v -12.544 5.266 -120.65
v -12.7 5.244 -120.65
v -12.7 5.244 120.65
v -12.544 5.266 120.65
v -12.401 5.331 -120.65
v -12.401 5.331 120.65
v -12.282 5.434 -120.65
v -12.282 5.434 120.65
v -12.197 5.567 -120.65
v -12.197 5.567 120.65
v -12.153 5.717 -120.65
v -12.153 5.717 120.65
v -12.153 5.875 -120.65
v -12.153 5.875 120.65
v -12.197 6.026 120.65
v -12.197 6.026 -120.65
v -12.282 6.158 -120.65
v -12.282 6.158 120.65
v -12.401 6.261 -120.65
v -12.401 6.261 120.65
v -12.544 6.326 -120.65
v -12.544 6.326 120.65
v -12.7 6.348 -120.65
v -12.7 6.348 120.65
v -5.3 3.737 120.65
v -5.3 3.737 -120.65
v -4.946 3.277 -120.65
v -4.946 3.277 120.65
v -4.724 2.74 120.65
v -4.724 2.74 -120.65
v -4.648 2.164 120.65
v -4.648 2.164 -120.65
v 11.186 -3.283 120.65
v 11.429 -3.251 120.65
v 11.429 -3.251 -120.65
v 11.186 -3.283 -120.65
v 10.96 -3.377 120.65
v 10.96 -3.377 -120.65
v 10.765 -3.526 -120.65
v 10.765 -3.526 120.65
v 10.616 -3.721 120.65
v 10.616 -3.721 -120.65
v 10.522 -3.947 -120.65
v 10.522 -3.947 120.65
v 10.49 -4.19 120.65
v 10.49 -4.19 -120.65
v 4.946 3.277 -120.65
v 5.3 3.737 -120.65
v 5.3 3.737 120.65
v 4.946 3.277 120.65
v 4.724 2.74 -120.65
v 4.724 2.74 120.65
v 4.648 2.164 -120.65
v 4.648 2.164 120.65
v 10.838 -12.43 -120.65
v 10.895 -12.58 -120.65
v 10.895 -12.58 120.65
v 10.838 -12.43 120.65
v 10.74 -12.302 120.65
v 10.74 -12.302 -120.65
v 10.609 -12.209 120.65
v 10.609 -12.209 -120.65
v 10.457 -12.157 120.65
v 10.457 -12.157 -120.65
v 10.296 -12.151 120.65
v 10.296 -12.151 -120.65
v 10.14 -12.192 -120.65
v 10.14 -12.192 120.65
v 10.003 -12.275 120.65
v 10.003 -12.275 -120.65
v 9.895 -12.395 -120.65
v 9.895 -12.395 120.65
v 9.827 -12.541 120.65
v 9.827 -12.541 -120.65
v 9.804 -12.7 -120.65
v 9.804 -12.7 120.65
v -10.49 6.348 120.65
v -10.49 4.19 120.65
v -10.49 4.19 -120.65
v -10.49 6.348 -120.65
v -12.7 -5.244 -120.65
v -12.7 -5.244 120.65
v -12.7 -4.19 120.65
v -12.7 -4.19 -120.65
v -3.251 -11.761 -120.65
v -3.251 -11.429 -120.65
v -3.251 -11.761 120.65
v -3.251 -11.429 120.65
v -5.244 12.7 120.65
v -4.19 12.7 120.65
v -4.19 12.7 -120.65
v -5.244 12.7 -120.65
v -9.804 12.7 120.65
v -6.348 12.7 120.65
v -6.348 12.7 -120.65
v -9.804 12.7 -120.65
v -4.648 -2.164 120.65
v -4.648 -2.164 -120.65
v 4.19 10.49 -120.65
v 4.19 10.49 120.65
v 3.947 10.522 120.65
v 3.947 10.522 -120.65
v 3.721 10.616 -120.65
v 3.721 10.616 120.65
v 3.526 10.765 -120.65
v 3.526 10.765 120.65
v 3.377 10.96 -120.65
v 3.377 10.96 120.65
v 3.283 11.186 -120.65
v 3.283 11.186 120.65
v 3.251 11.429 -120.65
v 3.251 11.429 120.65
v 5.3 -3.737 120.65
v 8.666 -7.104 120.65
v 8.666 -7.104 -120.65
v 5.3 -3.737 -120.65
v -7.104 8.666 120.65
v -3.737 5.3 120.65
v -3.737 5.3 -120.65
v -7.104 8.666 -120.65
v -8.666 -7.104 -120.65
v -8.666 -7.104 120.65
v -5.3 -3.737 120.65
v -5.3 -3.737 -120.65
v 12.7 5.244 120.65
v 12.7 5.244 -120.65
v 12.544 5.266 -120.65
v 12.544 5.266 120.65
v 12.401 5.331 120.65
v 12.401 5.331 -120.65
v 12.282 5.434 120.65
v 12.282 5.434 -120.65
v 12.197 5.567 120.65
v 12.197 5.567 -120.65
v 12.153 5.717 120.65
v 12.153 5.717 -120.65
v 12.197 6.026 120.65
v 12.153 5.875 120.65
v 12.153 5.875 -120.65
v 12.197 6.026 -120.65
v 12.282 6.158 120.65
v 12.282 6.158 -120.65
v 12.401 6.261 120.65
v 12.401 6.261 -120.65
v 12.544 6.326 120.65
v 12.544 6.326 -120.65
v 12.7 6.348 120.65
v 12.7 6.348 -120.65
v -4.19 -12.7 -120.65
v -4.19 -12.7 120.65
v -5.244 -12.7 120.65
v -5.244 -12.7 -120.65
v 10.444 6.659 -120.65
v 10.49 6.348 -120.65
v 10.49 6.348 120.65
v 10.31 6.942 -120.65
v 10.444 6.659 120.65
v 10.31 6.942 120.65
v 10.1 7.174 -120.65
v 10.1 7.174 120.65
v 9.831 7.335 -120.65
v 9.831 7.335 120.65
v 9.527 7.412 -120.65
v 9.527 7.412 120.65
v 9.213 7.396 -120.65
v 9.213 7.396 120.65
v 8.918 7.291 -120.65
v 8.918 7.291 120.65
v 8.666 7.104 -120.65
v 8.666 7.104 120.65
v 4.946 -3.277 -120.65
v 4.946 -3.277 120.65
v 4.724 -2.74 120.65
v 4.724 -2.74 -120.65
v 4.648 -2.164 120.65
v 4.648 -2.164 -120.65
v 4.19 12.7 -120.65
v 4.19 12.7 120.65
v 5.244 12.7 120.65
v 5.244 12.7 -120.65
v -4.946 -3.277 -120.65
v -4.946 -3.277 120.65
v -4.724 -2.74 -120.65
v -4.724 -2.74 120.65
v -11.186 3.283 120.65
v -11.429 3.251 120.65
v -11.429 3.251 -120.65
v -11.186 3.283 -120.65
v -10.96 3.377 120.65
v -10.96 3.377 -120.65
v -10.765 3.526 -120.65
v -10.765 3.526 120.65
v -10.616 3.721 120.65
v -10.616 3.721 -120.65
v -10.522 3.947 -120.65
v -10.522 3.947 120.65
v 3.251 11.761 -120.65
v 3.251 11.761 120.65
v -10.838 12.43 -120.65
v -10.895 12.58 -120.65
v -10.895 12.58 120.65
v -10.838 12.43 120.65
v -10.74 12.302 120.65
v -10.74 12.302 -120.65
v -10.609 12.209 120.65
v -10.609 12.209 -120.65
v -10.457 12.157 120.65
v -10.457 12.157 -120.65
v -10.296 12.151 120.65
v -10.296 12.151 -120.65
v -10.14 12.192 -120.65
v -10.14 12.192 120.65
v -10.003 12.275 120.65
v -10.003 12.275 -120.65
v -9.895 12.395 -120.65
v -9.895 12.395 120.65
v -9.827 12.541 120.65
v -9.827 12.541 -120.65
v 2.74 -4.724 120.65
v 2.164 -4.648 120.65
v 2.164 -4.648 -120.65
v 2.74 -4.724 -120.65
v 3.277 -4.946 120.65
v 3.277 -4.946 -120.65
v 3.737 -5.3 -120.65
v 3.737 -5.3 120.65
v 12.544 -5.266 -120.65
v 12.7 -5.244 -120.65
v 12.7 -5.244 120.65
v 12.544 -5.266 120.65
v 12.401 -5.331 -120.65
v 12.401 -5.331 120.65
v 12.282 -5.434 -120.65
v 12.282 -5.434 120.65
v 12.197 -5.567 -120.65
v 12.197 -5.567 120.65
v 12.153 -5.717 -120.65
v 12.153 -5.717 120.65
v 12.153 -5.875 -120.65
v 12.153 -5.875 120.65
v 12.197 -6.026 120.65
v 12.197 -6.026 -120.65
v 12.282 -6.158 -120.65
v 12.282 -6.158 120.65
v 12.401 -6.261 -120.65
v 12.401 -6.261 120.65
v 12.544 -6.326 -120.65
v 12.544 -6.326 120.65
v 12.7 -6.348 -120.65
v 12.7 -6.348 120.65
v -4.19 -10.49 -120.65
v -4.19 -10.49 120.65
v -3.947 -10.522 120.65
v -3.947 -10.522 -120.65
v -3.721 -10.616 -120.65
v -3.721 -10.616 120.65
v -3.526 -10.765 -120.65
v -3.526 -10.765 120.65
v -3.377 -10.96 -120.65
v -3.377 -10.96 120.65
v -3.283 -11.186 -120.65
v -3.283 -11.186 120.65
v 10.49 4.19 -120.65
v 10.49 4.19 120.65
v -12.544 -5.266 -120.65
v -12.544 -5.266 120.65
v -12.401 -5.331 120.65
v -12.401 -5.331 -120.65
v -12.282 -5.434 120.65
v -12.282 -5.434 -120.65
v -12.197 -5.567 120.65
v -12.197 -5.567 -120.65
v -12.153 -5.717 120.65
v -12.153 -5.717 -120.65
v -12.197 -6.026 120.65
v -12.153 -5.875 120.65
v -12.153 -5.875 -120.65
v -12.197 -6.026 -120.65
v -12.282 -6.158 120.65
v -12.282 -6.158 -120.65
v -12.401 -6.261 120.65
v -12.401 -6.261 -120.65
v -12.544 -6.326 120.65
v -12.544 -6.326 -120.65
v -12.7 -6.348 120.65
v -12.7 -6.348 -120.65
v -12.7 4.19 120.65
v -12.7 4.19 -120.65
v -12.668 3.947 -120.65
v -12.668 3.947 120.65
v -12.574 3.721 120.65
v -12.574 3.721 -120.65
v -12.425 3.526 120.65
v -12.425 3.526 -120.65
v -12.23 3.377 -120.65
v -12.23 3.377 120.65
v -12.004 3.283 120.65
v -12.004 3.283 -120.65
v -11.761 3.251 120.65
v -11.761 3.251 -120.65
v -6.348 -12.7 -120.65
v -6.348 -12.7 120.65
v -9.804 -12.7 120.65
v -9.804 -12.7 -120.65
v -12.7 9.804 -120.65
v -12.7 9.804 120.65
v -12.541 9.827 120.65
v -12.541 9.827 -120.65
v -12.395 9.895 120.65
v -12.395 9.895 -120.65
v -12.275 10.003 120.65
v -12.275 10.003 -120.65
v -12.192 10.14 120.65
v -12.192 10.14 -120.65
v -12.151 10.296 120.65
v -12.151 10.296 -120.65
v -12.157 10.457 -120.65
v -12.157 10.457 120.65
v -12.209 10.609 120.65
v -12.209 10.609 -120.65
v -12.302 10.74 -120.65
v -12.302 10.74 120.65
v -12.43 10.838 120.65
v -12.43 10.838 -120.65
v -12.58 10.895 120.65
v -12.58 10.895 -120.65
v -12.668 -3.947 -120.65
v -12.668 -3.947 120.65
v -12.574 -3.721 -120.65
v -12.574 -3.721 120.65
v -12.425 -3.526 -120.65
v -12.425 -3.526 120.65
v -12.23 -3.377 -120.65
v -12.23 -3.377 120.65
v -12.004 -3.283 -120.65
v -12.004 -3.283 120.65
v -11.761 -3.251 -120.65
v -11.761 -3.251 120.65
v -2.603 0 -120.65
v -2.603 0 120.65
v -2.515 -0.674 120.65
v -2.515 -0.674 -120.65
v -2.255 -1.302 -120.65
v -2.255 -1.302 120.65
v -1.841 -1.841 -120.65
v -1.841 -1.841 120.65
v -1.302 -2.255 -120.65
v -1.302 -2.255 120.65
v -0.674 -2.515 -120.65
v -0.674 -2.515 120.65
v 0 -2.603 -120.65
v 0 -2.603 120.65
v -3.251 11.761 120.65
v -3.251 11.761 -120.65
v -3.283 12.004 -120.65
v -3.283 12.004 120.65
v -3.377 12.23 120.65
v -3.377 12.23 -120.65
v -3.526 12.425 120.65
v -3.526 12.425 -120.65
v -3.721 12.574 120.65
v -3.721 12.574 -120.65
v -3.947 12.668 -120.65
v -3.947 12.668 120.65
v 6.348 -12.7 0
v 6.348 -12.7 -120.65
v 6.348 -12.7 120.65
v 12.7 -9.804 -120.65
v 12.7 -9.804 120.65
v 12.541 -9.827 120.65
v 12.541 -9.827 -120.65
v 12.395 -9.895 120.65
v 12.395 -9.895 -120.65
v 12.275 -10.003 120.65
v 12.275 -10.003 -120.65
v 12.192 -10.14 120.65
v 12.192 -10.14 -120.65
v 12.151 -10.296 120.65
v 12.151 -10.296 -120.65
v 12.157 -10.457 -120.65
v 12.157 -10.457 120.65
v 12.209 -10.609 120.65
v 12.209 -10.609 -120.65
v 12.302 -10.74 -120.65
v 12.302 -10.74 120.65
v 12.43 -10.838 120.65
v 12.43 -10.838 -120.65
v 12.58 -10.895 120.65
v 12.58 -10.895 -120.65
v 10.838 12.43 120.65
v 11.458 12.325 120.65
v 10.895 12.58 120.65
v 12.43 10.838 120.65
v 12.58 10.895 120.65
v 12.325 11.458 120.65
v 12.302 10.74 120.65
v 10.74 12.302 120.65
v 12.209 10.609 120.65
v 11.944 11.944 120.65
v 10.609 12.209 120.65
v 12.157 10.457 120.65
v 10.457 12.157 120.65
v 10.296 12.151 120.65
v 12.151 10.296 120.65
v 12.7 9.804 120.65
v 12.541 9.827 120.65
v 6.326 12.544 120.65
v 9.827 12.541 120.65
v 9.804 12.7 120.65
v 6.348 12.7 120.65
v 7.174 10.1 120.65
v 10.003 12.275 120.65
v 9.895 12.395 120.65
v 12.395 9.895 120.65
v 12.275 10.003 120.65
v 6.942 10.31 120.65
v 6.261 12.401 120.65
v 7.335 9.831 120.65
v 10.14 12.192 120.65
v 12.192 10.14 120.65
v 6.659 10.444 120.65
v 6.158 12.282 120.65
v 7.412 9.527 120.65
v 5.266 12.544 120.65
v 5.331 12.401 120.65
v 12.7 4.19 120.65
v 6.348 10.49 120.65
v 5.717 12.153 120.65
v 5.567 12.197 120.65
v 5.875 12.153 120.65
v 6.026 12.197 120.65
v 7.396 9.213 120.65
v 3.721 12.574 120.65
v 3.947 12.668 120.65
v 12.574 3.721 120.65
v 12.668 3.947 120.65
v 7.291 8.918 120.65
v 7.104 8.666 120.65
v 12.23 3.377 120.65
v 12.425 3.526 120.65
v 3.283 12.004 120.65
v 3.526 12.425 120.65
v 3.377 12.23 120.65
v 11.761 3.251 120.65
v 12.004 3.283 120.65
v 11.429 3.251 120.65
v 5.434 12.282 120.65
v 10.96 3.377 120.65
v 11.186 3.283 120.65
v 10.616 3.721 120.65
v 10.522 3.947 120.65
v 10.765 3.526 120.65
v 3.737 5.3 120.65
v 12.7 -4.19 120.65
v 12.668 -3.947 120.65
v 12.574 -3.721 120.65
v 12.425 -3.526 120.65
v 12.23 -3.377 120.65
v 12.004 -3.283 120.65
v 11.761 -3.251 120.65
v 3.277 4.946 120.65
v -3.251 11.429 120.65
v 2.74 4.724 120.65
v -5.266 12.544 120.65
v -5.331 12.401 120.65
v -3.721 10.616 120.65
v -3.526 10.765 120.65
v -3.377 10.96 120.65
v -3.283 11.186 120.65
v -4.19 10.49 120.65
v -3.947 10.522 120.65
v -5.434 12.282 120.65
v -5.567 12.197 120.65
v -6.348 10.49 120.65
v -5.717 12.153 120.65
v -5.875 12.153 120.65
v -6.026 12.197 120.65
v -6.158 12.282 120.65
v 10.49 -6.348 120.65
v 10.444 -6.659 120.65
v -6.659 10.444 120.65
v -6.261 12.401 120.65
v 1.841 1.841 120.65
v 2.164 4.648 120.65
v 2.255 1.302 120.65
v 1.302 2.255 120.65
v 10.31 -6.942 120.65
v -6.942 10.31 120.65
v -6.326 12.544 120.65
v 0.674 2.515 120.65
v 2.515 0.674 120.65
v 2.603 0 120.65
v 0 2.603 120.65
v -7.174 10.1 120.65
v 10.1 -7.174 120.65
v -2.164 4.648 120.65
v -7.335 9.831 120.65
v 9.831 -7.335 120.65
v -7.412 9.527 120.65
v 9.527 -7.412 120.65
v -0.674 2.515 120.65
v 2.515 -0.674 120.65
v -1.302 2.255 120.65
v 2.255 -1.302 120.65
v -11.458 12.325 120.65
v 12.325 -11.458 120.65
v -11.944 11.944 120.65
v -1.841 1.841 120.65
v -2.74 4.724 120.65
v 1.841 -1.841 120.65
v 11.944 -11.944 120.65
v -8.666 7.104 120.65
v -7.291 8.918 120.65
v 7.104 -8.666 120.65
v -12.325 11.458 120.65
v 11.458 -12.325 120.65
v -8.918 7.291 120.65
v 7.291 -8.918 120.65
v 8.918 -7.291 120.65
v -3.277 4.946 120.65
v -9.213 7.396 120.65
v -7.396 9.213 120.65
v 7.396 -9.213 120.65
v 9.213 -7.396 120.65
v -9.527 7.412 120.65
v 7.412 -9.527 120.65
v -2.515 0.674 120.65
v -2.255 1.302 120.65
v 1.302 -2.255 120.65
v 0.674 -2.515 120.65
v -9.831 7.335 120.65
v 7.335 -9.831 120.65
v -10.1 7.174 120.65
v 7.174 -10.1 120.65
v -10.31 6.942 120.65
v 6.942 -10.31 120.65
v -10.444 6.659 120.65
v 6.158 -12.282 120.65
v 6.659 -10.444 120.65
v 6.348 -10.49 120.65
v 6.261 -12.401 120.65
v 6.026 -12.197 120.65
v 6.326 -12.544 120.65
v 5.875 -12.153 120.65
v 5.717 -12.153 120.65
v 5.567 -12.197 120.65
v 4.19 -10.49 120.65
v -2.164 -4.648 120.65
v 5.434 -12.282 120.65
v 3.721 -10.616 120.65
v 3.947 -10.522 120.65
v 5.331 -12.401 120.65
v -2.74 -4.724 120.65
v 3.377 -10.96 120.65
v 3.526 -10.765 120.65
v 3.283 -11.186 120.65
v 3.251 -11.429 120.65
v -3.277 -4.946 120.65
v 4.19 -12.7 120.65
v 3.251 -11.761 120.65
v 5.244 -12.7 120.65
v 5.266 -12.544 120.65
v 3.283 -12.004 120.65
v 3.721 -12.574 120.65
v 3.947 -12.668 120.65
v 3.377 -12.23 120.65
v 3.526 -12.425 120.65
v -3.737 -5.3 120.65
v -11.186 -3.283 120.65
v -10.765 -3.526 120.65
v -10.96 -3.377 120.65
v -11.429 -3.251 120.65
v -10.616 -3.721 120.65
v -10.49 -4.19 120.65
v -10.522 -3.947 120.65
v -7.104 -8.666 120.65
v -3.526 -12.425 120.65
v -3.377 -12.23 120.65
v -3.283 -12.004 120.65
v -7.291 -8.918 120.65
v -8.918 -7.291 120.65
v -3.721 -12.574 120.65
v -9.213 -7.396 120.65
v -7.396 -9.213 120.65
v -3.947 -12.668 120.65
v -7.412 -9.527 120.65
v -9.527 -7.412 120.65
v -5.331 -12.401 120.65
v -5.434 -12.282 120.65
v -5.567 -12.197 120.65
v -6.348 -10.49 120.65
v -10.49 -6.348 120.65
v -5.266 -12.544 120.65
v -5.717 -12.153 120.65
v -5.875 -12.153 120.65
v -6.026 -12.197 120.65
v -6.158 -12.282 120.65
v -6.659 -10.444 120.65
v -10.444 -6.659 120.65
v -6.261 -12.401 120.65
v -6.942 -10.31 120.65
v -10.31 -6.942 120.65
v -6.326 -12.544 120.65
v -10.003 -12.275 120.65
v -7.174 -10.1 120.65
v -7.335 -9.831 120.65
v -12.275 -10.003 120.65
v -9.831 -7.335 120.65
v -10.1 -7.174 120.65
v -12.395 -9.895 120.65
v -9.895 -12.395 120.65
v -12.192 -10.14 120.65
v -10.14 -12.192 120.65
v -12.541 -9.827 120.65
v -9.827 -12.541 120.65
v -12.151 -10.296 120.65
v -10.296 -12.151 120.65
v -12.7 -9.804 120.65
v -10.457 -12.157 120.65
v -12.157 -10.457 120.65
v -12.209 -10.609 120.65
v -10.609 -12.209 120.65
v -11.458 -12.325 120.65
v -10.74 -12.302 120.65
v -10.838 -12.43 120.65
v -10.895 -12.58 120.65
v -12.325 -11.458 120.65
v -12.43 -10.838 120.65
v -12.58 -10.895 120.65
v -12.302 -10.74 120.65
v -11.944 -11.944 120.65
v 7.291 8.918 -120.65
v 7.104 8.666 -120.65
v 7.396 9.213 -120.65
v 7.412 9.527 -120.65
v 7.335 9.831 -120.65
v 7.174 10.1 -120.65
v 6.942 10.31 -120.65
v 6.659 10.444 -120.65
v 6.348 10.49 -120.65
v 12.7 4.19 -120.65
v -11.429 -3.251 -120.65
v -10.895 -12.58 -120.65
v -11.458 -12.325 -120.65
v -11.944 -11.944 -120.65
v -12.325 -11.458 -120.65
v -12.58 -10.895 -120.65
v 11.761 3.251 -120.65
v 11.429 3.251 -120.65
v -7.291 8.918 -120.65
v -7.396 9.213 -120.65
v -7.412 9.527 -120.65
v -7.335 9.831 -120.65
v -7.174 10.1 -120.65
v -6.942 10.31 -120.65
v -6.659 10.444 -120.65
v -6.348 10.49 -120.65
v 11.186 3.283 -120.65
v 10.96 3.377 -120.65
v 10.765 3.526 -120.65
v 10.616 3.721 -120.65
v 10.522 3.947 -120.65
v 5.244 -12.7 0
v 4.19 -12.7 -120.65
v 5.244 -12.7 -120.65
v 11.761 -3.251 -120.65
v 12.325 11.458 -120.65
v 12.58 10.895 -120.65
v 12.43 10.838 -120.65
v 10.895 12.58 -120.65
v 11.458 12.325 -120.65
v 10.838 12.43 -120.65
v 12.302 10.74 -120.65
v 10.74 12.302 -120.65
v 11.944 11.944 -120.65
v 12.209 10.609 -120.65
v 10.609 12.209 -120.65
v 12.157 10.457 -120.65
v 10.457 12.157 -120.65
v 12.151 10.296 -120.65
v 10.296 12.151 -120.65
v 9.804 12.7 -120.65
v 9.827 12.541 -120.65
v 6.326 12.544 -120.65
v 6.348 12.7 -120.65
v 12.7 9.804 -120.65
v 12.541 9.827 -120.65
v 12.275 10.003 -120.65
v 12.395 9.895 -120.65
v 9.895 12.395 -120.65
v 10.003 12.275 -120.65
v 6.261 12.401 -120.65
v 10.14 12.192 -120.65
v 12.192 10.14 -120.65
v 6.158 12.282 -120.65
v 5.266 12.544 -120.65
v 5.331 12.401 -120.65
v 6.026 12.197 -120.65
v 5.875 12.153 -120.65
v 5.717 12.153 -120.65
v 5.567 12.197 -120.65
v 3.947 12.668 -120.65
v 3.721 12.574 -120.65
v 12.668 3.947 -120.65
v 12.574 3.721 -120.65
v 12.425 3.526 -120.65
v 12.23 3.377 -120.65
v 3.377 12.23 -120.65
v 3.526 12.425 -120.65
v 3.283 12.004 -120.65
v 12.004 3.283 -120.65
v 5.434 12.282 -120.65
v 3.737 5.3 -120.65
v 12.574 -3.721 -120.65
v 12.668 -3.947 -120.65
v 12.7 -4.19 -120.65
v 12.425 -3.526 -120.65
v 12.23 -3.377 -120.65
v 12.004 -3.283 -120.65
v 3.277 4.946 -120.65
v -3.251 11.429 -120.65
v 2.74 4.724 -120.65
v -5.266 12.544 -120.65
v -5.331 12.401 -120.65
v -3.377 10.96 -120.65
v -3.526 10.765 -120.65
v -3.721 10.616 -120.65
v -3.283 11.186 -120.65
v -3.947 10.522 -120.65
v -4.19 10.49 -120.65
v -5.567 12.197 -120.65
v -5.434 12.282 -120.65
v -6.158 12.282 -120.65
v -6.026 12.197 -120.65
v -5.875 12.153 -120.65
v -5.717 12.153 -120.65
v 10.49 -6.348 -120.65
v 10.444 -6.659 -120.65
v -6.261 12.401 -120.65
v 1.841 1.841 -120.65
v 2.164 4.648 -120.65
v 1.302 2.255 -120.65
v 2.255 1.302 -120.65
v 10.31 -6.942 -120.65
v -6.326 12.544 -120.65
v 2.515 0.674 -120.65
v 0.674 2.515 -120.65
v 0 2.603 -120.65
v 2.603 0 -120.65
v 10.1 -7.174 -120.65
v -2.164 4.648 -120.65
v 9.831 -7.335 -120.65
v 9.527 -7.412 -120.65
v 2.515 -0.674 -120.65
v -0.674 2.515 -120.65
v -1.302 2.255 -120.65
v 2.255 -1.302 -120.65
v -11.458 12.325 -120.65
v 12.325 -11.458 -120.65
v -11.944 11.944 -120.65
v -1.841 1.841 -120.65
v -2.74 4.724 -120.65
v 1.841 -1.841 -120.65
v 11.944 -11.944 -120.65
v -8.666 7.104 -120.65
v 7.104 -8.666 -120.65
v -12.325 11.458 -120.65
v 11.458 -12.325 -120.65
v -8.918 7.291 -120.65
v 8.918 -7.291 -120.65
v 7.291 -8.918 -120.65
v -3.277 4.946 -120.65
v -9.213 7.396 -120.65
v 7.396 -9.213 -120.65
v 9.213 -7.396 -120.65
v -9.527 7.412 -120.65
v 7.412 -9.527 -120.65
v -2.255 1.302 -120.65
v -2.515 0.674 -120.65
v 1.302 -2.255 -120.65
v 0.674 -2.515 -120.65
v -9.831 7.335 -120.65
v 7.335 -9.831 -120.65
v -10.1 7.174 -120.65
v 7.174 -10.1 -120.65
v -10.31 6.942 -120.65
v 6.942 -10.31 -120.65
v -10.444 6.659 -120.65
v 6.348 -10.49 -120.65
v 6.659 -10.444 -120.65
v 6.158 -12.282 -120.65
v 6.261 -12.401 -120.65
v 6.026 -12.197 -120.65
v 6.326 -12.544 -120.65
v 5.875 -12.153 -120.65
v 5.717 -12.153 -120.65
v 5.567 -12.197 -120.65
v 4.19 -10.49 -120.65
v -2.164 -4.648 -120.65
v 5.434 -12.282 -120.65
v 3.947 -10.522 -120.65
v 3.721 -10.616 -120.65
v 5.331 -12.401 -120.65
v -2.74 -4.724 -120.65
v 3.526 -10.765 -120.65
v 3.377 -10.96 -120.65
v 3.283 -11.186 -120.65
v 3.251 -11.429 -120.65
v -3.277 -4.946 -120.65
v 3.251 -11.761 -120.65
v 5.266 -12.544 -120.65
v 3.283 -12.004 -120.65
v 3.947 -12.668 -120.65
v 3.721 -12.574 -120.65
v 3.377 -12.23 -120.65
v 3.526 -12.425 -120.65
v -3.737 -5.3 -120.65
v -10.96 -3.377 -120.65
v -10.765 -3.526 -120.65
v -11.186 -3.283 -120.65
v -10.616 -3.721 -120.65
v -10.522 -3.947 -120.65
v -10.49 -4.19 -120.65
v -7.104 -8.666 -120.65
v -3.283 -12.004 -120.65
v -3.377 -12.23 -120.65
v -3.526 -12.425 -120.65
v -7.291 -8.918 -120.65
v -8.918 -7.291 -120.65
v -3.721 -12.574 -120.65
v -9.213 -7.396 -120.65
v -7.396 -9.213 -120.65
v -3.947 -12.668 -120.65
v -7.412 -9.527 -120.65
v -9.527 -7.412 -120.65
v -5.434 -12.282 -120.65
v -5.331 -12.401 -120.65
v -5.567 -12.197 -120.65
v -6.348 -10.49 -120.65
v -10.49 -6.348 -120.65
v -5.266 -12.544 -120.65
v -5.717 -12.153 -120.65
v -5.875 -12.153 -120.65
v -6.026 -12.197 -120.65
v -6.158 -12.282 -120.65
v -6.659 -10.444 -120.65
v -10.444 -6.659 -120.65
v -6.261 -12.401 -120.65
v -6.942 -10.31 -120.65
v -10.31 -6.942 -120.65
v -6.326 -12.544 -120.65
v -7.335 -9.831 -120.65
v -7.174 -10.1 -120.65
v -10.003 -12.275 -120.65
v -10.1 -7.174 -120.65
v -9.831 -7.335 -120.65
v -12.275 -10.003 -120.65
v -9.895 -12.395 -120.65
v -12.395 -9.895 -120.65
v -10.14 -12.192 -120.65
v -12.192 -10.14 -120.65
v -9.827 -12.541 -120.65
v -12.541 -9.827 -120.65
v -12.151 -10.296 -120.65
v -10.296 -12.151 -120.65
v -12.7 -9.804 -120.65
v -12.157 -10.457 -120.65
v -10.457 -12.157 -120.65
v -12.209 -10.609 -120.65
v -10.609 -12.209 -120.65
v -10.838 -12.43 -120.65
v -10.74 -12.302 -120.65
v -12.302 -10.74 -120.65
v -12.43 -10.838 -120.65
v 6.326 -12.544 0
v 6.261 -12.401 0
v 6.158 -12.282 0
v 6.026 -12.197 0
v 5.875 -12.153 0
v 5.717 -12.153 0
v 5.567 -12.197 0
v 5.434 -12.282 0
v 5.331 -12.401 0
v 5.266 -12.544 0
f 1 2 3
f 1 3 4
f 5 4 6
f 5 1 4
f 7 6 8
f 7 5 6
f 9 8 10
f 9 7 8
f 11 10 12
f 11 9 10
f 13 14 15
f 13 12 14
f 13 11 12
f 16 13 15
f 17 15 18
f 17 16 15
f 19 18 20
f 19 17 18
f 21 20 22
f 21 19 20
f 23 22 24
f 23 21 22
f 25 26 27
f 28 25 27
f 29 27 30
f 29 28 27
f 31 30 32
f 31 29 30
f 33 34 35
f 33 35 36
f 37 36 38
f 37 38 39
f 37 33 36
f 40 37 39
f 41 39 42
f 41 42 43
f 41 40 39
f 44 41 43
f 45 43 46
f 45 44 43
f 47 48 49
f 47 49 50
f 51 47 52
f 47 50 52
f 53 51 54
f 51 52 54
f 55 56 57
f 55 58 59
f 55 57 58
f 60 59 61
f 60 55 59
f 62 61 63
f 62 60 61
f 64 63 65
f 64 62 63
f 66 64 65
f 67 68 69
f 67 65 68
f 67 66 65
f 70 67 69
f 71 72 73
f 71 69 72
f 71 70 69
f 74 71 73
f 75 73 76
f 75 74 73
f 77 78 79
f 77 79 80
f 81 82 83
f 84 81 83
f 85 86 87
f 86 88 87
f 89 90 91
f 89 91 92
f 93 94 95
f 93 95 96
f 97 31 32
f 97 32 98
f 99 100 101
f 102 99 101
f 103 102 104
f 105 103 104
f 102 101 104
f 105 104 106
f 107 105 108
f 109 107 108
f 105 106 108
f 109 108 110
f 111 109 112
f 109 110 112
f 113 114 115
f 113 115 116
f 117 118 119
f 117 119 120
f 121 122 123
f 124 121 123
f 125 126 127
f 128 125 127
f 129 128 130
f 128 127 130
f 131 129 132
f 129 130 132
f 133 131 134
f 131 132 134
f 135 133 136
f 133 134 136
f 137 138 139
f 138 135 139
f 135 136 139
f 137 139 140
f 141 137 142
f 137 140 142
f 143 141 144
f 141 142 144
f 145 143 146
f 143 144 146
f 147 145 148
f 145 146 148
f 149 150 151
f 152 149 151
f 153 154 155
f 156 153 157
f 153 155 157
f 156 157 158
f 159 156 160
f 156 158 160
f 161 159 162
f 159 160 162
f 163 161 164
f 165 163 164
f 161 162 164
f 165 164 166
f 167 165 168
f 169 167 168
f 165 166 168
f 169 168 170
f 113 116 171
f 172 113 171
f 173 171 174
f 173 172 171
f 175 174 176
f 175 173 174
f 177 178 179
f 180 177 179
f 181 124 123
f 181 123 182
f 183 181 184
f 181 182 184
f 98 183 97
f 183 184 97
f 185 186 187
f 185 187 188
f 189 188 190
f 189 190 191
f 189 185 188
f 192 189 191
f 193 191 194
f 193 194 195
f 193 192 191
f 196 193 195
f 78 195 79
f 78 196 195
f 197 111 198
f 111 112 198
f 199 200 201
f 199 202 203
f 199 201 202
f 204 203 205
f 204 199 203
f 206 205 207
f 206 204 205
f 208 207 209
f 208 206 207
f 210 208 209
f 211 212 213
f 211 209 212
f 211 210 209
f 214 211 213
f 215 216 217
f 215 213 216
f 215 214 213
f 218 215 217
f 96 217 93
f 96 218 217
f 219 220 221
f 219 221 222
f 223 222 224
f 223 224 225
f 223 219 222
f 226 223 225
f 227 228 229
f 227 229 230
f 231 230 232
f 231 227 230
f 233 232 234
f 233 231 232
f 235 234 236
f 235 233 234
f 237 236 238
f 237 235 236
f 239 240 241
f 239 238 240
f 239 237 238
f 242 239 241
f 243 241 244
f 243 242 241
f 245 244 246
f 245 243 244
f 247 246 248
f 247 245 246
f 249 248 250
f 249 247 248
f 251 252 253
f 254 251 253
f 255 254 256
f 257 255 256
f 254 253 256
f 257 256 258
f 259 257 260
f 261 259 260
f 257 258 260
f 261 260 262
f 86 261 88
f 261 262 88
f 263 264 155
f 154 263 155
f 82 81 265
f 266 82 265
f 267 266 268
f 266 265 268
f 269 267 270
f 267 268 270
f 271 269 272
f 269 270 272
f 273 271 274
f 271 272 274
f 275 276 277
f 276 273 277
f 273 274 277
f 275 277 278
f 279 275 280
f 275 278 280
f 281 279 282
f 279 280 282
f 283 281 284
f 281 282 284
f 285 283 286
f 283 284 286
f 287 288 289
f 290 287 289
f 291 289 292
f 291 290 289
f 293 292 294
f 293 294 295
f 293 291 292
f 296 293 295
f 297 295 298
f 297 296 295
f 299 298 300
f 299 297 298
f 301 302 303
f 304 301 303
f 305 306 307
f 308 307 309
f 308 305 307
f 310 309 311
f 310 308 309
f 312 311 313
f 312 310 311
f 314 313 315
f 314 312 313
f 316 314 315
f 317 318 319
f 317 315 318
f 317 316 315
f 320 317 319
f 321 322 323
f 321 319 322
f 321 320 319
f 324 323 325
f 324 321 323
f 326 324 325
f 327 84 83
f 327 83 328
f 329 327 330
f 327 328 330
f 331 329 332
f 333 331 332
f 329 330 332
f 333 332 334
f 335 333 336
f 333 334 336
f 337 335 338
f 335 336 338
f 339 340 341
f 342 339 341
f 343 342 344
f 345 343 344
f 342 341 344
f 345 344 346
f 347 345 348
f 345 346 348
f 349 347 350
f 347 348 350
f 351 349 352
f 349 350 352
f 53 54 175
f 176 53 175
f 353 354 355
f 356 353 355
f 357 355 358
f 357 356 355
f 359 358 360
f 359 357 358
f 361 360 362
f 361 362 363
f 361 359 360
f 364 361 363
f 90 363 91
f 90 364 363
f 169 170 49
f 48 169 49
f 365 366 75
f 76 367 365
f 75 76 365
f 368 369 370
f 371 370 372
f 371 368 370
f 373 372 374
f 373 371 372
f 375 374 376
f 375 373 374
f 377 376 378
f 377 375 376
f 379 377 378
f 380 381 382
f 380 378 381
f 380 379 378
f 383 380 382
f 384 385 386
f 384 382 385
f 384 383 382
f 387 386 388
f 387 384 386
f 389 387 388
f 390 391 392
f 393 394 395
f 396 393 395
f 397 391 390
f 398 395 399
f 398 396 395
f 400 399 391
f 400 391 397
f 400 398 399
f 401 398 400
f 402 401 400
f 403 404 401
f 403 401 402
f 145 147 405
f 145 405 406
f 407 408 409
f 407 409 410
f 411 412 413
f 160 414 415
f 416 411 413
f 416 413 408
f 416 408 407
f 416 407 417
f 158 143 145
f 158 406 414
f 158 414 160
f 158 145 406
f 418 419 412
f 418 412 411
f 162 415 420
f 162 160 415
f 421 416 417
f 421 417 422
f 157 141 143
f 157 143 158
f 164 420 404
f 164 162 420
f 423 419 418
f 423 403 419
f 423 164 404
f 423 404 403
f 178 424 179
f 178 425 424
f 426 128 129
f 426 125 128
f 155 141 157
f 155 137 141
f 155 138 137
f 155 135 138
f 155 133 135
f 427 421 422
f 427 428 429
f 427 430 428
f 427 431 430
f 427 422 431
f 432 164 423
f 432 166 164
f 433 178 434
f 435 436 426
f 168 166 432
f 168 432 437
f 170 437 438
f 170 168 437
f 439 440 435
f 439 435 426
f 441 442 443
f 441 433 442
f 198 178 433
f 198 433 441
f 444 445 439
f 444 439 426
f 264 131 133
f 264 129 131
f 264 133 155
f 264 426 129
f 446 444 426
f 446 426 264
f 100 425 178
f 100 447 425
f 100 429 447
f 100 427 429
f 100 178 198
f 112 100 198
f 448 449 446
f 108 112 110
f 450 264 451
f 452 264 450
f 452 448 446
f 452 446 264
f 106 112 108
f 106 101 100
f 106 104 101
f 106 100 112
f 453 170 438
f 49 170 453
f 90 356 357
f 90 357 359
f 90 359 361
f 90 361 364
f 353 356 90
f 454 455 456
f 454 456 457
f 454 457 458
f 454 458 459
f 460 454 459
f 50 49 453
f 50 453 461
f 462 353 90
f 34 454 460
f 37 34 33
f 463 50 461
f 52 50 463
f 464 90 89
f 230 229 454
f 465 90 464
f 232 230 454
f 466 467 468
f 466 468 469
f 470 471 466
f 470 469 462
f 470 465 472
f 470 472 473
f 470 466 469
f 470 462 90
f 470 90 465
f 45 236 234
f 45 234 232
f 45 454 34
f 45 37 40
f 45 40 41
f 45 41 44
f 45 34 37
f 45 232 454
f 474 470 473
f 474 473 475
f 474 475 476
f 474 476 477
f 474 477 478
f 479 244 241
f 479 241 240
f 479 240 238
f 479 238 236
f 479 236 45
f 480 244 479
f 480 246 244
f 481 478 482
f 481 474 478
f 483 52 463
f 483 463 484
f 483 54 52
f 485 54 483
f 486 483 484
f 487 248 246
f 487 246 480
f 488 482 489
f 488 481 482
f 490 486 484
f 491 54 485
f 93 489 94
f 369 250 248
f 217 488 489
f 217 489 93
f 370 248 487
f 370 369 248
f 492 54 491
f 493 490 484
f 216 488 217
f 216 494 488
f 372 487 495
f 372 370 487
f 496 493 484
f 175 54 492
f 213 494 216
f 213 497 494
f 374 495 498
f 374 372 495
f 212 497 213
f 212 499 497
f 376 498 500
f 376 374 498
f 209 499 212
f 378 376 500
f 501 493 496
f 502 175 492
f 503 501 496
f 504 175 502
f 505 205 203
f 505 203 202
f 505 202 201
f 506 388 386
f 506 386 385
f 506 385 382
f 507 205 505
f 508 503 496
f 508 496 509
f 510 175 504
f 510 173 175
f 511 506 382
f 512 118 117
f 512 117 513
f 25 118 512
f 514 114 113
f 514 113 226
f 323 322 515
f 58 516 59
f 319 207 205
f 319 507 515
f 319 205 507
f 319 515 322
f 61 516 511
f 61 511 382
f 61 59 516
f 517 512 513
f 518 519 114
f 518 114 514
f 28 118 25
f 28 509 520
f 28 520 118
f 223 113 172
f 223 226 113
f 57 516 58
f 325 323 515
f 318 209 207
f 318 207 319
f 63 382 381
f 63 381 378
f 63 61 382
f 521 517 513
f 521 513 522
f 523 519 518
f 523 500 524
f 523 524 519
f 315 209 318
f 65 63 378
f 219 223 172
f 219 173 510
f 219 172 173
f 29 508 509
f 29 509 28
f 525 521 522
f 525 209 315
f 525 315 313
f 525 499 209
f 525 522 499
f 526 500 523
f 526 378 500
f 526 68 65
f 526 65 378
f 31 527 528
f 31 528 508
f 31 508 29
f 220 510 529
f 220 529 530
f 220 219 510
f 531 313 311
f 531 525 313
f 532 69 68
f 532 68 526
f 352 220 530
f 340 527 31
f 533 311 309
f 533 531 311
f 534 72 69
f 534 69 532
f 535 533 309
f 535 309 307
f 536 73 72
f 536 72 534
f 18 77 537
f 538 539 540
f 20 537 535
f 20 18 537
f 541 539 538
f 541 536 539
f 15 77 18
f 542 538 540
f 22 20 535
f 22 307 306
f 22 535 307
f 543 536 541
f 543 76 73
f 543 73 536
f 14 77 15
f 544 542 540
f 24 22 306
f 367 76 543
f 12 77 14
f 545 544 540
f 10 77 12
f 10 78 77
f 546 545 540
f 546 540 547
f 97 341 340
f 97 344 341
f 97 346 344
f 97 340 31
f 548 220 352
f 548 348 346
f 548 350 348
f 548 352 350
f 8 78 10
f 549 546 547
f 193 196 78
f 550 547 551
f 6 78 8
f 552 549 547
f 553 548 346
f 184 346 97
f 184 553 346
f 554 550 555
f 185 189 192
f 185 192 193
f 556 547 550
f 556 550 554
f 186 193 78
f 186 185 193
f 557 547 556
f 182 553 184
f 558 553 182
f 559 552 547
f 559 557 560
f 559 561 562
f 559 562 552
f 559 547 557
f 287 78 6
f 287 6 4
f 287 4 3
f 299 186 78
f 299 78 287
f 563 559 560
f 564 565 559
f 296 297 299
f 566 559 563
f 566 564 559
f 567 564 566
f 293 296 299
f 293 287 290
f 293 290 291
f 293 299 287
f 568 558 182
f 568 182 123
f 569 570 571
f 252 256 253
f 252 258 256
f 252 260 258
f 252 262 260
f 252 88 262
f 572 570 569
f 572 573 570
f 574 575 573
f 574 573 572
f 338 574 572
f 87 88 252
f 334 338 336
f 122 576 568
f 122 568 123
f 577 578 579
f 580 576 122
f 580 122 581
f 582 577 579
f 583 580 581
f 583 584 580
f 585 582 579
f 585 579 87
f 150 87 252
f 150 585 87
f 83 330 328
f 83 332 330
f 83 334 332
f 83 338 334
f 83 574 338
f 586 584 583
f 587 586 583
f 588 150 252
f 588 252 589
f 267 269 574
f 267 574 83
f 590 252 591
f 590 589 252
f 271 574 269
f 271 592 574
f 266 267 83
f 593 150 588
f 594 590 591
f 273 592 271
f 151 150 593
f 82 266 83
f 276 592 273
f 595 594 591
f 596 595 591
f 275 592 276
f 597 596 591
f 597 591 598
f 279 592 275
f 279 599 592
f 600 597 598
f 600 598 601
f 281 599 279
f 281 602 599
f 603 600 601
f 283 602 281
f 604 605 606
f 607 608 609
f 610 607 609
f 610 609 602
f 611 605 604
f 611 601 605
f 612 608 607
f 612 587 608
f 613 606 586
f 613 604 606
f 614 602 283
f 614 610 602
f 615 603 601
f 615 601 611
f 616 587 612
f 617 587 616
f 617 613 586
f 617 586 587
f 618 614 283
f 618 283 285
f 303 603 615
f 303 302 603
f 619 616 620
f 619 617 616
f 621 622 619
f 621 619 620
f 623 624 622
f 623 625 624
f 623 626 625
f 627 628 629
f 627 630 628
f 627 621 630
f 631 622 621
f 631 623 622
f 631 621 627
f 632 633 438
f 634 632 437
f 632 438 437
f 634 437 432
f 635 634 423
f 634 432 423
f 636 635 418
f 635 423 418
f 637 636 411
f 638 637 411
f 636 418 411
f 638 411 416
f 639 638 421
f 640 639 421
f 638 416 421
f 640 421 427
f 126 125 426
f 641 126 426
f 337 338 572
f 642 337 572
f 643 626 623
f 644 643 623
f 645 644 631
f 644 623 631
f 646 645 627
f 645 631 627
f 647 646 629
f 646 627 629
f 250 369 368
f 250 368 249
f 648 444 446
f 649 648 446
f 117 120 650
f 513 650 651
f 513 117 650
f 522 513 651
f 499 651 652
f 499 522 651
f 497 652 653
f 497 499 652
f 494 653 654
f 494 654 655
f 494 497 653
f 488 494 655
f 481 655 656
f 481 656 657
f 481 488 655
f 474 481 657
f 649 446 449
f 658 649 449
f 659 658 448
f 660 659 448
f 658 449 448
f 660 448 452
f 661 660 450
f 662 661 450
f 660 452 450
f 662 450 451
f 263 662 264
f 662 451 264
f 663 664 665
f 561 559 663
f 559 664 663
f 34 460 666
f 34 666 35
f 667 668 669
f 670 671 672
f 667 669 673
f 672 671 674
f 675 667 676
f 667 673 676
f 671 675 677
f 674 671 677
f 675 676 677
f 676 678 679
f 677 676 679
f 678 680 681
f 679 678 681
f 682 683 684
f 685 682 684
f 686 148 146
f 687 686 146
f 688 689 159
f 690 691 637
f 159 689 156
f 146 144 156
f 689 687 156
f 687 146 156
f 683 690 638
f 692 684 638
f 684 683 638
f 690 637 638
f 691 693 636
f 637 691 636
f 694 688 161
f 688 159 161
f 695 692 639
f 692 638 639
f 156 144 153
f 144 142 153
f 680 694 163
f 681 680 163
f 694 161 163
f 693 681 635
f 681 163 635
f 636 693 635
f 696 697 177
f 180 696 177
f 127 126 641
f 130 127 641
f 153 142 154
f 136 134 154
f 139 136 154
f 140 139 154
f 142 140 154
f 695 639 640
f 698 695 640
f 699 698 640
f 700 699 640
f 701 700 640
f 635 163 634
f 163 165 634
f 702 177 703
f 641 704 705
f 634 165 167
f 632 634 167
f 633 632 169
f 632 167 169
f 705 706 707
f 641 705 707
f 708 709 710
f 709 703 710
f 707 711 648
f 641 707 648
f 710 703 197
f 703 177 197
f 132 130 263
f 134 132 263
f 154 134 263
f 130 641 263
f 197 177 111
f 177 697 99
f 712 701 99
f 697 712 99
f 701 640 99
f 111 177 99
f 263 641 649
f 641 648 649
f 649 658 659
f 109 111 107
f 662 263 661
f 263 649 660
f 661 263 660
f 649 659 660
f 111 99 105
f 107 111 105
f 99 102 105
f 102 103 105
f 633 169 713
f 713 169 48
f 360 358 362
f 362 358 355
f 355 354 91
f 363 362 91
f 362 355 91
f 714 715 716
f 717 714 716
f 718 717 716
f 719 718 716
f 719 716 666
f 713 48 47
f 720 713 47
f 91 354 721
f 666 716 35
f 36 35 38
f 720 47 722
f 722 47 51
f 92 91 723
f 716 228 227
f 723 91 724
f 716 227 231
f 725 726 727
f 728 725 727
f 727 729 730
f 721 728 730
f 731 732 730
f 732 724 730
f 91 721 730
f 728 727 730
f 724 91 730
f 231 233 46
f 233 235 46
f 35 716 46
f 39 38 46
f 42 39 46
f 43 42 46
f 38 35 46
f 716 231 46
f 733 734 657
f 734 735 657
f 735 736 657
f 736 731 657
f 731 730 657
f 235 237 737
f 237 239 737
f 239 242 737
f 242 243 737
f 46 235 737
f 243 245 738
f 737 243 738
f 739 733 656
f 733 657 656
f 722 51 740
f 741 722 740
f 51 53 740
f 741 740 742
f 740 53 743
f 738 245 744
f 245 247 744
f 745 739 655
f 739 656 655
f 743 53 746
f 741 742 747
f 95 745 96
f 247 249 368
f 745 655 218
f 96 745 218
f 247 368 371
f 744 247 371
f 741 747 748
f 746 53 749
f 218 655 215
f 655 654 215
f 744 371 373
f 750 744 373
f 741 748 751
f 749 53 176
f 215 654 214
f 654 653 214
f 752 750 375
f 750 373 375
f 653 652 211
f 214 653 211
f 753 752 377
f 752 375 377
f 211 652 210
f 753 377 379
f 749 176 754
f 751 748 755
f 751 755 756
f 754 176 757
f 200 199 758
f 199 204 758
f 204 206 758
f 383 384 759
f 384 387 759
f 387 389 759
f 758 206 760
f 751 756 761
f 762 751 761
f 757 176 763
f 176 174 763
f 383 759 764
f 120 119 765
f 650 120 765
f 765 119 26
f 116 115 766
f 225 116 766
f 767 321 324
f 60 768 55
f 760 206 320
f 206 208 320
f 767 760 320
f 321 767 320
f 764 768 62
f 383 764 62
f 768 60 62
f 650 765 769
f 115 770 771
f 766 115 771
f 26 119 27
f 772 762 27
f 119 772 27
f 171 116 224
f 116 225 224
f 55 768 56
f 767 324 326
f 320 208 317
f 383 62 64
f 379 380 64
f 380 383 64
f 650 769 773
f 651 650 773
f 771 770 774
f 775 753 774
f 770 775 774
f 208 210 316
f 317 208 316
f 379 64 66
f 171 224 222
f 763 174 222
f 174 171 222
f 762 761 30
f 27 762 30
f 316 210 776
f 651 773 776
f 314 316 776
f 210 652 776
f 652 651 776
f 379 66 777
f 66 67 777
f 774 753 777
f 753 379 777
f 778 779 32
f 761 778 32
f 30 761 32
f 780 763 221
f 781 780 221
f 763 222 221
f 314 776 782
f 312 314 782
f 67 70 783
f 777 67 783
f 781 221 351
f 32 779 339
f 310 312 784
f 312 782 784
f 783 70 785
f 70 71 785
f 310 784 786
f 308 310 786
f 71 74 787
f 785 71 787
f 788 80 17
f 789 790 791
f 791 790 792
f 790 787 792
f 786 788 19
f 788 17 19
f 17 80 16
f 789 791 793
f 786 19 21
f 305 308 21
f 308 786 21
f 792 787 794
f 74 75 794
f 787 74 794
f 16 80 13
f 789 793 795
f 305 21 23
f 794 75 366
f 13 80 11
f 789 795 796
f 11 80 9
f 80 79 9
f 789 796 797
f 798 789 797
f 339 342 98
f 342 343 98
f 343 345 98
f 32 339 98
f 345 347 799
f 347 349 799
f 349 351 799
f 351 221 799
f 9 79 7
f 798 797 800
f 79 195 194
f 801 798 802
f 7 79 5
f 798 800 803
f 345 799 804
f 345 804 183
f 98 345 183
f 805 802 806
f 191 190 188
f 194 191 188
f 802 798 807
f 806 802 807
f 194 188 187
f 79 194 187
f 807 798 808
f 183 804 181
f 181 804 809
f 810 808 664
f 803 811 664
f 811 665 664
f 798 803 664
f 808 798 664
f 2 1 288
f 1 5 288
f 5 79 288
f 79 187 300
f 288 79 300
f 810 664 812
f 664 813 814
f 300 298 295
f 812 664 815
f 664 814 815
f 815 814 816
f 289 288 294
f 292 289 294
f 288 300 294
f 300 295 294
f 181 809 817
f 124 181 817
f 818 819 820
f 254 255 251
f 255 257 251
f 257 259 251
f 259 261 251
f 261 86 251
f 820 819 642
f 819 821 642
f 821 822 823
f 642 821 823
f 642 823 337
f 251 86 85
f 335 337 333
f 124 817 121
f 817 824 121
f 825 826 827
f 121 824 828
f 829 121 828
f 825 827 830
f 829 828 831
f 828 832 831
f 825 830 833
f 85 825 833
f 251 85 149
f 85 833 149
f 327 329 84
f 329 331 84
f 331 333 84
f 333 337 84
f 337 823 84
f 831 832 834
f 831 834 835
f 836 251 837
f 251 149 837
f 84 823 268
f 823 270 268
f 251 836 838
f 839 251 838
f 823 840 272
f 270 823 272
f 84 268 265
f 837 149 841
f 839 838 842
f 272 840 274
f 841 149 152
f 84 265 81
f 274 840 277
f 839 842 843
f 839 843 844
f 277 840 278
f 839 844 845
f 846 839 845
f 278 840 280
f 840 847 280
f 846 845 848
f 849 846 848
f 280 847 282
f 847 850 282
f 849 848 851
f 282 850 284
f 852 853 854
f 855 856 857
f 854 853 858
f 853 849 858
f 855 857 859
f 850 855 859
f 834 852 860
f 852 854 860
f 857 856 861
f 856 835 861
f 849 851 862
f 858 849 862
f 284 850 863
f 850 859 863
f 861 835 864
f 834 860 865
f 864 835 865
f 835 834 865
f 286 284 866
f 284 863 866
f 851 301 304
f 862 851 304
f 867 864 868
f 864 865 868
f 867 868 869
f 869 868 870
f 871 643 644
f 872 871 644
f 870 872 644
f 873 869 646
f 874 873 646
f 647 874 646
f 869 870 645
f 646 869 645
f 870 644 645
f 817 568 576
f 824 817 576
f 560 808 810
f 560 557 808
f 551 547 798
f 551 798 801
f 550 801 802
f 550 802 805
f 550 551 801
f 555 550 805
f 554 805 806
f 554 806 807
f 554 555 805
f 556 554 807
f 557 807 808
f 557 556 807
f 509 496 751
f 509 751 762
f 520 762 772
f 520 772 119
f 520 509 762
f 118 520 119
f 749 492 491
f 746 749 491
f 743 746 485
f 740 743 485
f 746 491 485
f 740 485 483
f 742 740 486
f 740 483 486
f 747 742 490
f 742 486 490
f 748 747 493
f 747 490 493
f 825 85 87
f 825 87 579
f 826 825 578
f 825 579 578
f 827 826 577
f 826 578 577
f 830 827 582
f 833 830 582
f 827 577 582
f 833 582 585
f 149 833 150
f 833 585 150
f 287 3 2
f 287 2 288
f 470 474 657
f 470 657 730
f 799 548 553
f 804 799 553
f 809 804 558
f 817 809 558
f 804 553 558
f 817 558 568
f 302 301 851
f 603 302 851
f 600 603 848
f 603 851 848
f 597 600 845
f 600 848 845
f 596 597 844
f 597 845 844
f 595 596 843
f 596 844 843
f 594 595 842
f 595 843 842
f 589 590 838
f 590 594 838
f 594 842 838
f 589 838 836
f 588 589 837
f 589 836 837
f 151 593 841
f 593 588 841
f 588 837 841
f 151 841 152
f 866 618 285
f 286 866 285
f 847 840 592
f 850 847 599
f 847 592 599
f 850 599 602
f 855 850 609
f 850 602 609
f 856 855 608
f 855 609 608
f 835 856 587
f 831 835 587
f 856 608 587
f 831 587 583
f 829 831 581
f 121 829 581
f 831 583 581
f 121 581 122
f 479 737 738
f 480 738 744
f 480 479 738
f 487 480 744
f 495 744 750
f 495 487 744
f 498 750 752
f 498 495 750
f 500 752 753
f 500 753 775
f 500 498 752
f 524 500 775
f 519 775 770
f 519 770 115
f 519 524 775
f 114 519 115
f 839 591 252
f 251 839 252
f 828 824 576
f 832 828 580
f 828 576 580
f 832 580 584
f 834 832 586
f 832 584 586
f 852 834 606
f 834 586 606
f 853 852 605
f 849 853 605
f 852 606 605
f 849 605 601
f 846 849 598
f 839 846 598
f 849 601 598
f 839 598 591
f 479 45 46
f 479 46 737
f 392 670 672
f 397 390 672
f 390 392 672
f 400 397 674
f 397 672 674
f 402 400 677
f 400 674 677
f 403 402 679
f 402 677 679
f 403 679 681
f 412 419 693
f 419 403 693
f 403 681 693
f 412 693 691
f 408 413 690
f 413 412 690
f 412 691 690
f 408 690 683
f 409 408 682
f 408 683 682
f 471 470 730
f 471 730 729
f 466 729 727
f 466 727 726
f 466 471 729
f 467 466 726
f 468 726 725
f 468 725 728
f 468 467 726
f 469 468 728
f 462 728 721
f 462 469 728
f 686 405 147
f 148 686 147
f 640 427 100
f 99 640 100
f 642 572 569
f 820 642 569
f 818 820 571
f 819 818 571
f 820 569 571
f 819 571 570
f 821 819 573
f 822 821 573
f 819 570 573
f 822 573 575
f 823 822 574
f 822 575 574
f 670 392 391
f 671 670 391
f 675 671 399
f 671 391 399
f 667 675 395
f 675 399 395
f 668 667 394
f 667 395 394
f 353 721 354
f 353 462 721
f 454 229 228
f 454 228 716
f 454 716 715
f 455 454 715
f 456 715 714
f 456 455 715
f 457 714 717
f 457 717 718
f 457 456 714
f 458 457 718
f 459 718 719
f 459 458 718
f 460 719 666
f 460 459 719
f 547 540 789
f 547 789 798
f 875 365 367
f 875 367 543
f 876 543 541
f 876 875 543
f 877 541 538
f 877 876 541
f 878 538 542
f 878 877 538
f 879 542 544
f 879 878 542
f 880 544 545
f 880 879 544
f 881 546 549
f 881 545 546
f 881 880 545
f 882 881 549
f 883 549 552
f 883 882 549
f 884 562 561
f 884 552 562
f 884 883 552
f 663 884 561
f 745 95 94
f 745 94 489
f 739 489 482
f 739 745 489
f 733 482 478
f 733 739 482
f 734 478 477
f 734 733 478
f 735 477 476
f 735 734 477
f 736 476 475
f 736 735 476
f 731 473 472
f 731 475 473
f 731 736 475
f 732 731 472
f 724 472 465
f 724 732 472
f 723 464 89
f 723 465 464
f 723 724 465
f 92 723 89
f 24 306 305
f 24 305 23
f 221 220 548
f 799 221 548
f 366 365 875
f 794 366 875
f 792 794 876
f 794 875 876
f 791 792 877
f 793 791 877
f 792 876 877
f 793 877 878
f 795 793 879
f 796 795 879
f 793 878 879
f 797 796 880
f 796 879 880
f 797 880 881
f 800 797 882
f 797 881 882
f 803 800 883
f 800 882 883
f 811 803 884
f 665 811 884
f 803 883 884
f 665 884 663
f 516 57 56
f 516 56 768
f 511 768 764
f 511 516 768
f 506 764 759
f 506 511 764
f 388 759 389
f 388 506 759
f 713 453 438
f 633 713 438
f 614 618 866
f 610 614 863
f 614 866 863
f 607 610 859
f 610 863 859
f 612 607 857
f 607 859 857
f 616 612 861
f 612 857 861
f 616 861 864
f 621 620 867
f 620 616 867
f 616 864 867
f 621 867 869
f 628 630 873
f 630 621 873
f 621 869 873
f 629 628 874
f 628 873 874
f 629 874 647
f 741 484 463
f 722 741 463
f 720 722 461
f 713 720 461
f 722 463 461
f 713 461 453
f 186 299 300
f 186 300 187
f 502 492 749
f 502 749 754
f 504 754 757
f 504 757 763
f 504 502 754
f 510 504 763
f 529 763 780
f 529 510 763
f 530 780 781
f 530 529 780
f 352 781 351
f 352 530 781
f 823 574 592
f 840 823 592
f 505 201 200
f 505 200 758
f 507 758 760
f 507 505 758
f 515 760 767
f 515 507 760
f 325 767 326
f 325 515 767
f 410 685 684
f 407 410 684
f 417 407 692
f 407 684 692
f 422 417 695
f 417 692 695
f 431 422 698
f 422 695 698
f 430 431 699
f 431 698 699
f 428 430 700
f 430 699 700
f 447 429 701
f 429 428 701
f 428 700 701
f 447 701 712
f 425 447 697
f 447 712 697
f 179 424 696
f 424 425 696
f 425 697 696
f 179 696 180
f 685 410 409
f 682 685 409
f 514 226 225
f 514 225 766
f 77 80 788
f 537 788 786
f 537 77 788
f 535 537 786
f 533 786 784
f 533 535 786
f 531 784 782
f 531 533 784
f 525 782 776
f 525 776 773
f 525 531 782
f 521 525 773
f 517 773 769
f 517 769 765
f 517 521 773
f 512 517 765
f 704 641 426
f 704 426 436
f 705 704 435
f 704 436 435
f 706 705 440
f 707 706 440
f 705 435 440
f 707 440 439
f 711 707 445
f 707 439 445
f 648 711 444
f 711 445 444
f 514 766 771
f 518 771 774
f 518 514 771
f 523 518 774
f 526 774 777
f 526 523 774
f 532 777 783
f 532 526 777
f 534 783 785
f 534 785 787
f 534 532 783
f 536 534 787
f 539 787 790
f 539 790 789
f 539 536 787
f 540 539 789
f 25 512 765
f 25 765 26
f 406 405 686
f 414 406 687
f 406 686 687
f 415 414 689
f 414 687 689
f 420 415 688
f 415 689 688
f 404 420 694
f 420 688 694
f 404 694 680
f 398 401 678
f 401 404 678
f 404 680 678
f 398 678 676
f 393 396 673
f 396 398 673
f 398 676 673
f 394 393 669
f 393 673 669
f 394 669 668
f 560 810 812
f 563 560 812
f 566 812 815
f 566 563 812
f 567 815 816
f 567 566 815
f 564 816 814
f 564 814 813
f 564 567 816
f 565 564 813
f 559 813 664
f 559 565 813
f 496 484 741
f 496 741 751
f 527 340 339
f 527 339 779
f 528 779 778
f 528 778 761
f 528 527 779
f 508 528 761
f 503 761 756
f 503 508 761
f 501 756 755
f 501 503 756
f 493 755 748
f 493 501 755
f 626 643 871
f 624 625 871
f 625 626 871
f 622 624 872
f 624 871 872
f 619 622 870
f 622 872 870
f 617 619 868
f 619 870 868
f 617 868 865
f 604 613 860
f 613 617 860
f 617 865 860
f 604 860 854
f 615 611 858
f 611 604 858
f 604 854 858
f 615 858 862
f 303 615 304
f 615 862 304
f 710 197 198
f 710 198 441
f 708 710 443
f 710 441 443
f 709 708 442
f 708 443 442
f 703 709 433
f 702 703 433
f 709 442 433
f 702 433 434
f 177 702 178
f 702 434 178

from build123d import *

# Parameters (mm, degrees)
BOSS_EXTRUDE1_DEPTH     = 120.65
SKETCH5_R               = 0.55245
CUT_EXTRUDE1_DEPTH      = 121.65
CUT_EXTRUDE1_DEPTH_BACK = 121.65


with BuildPart() as part:
    # Sketch4 → Boss-Extrude1 (new body, symmetric)
    with BuildSketch(Plane.XY):
        with BuildLine():
            Line((4.190365, -12.7), (10.11729625, -12.7))
            ThreePointArc((10.11729625, -12.7), (11.943543585, -11.943543585), (12.7, -10.11729625))
            Line((12.7, -10.11729625), (12.7, -4.190365))
            ThreePointArc((12.7, -4.190365), (12.42492494, -3.52627506), (11.760835, -3.2512))
            Line((11.760835, -3.2512), (11.429365, -3.2512))
            ThreePointArc((11.429365, -3.2512), (10.76527506, -3.52627506), (10.4902, -4.190365))
            Line((10.4902, -4.190365), (10.4902, -6.348478019))
            ThreePointArc((10.4902, -6.348478019), (9.830707141, -7.335478831), (8.666460301, -7.103895736))
            Line((8.666460301, -7.103895736), (5.299899128, -3.737334563))
            ThreePointArc((5.299899128, -3.737334563), (4.817571085, -3.015479634), (4.6482, -2.16399369))
            Line((4.6482, -2.16399369), (4.6482, 0))
            Line((4.6482, 0), (2.6035, 0))
            ThreePointArc((2.6035, 0), (1.840952505, -1.840952505), (0, -2.6035))
            Line((0, -2.6035), (0, -4.6482))
            Line((0, -4.6482), (2.16399369, -4.6482))
            ThreePointArc((2.16399369, -4.6482), (3.015479634, -4.817571085), (3.737334563, -5.299899128))
            Line((3.737334563, -5.299899128), (7.103895736, -8.666460301))
            ThreePointArc((7.103895736, -8.666460301), (7.335478831, -9.830707141), (6.348478019, -10.4902))
            Line((6.348478019, -10.4902), (4.190365, -10.4902))
            ThreePointArc((4.190365, -10.4902), (3.52627506, -10.76527506), (3.2512, -11.429365))
            Line((3.2512, -11.429365), (3.2512, -11.760835))
            ThreePointArc((3.2512, -11.760835), (3.52627506, -12.42492494), (4.190365, -12.7))
        make_face()
    extrude(amount=BOSS_EXTRUDE1_DEPTH, both=True)

    # Sketch5 → Cut-Extrude1 (cut, two sides)
    with BuildSketch(Plane.XY) as cut_extrude1_sk:
        with Locations((10.356153152, -12.7)):
            Circle(SKETCH5_R)
        with Locations((5.796028019, -12.7)):
            Circle(SKETCH5_R)
        with Locations((12.7, -10.356153152)):
            Circle(SKETCH5_R)
        with Locations((12.7, -5.796028019)):
            Circle(SKETCH5_R)
    extrude(amount=CUT_EXTRUDE1_DEPTH, mode=Mode.SUBTRACT)
    extrude(cut_extrude1_sk.sketch, amount=-CUT_EXTRUDE1_DEPTH_BACK, mode=Mode.SUBTRACT)

    # Mirror1: part across plane


with BuildPart() as part_1:
    add(part.part)
    add(part.part.mirror(Plane(origin=(0, 0, 0), x_dir=(0, 0, 1), z_dir=(1, 0, 0))))

    # Mirror2: part across plane


with BuildPart() as part_2:
    add(part_1.part)
    add(part_1.part.mirror(Plane.ZX))


solid = part_2.part
